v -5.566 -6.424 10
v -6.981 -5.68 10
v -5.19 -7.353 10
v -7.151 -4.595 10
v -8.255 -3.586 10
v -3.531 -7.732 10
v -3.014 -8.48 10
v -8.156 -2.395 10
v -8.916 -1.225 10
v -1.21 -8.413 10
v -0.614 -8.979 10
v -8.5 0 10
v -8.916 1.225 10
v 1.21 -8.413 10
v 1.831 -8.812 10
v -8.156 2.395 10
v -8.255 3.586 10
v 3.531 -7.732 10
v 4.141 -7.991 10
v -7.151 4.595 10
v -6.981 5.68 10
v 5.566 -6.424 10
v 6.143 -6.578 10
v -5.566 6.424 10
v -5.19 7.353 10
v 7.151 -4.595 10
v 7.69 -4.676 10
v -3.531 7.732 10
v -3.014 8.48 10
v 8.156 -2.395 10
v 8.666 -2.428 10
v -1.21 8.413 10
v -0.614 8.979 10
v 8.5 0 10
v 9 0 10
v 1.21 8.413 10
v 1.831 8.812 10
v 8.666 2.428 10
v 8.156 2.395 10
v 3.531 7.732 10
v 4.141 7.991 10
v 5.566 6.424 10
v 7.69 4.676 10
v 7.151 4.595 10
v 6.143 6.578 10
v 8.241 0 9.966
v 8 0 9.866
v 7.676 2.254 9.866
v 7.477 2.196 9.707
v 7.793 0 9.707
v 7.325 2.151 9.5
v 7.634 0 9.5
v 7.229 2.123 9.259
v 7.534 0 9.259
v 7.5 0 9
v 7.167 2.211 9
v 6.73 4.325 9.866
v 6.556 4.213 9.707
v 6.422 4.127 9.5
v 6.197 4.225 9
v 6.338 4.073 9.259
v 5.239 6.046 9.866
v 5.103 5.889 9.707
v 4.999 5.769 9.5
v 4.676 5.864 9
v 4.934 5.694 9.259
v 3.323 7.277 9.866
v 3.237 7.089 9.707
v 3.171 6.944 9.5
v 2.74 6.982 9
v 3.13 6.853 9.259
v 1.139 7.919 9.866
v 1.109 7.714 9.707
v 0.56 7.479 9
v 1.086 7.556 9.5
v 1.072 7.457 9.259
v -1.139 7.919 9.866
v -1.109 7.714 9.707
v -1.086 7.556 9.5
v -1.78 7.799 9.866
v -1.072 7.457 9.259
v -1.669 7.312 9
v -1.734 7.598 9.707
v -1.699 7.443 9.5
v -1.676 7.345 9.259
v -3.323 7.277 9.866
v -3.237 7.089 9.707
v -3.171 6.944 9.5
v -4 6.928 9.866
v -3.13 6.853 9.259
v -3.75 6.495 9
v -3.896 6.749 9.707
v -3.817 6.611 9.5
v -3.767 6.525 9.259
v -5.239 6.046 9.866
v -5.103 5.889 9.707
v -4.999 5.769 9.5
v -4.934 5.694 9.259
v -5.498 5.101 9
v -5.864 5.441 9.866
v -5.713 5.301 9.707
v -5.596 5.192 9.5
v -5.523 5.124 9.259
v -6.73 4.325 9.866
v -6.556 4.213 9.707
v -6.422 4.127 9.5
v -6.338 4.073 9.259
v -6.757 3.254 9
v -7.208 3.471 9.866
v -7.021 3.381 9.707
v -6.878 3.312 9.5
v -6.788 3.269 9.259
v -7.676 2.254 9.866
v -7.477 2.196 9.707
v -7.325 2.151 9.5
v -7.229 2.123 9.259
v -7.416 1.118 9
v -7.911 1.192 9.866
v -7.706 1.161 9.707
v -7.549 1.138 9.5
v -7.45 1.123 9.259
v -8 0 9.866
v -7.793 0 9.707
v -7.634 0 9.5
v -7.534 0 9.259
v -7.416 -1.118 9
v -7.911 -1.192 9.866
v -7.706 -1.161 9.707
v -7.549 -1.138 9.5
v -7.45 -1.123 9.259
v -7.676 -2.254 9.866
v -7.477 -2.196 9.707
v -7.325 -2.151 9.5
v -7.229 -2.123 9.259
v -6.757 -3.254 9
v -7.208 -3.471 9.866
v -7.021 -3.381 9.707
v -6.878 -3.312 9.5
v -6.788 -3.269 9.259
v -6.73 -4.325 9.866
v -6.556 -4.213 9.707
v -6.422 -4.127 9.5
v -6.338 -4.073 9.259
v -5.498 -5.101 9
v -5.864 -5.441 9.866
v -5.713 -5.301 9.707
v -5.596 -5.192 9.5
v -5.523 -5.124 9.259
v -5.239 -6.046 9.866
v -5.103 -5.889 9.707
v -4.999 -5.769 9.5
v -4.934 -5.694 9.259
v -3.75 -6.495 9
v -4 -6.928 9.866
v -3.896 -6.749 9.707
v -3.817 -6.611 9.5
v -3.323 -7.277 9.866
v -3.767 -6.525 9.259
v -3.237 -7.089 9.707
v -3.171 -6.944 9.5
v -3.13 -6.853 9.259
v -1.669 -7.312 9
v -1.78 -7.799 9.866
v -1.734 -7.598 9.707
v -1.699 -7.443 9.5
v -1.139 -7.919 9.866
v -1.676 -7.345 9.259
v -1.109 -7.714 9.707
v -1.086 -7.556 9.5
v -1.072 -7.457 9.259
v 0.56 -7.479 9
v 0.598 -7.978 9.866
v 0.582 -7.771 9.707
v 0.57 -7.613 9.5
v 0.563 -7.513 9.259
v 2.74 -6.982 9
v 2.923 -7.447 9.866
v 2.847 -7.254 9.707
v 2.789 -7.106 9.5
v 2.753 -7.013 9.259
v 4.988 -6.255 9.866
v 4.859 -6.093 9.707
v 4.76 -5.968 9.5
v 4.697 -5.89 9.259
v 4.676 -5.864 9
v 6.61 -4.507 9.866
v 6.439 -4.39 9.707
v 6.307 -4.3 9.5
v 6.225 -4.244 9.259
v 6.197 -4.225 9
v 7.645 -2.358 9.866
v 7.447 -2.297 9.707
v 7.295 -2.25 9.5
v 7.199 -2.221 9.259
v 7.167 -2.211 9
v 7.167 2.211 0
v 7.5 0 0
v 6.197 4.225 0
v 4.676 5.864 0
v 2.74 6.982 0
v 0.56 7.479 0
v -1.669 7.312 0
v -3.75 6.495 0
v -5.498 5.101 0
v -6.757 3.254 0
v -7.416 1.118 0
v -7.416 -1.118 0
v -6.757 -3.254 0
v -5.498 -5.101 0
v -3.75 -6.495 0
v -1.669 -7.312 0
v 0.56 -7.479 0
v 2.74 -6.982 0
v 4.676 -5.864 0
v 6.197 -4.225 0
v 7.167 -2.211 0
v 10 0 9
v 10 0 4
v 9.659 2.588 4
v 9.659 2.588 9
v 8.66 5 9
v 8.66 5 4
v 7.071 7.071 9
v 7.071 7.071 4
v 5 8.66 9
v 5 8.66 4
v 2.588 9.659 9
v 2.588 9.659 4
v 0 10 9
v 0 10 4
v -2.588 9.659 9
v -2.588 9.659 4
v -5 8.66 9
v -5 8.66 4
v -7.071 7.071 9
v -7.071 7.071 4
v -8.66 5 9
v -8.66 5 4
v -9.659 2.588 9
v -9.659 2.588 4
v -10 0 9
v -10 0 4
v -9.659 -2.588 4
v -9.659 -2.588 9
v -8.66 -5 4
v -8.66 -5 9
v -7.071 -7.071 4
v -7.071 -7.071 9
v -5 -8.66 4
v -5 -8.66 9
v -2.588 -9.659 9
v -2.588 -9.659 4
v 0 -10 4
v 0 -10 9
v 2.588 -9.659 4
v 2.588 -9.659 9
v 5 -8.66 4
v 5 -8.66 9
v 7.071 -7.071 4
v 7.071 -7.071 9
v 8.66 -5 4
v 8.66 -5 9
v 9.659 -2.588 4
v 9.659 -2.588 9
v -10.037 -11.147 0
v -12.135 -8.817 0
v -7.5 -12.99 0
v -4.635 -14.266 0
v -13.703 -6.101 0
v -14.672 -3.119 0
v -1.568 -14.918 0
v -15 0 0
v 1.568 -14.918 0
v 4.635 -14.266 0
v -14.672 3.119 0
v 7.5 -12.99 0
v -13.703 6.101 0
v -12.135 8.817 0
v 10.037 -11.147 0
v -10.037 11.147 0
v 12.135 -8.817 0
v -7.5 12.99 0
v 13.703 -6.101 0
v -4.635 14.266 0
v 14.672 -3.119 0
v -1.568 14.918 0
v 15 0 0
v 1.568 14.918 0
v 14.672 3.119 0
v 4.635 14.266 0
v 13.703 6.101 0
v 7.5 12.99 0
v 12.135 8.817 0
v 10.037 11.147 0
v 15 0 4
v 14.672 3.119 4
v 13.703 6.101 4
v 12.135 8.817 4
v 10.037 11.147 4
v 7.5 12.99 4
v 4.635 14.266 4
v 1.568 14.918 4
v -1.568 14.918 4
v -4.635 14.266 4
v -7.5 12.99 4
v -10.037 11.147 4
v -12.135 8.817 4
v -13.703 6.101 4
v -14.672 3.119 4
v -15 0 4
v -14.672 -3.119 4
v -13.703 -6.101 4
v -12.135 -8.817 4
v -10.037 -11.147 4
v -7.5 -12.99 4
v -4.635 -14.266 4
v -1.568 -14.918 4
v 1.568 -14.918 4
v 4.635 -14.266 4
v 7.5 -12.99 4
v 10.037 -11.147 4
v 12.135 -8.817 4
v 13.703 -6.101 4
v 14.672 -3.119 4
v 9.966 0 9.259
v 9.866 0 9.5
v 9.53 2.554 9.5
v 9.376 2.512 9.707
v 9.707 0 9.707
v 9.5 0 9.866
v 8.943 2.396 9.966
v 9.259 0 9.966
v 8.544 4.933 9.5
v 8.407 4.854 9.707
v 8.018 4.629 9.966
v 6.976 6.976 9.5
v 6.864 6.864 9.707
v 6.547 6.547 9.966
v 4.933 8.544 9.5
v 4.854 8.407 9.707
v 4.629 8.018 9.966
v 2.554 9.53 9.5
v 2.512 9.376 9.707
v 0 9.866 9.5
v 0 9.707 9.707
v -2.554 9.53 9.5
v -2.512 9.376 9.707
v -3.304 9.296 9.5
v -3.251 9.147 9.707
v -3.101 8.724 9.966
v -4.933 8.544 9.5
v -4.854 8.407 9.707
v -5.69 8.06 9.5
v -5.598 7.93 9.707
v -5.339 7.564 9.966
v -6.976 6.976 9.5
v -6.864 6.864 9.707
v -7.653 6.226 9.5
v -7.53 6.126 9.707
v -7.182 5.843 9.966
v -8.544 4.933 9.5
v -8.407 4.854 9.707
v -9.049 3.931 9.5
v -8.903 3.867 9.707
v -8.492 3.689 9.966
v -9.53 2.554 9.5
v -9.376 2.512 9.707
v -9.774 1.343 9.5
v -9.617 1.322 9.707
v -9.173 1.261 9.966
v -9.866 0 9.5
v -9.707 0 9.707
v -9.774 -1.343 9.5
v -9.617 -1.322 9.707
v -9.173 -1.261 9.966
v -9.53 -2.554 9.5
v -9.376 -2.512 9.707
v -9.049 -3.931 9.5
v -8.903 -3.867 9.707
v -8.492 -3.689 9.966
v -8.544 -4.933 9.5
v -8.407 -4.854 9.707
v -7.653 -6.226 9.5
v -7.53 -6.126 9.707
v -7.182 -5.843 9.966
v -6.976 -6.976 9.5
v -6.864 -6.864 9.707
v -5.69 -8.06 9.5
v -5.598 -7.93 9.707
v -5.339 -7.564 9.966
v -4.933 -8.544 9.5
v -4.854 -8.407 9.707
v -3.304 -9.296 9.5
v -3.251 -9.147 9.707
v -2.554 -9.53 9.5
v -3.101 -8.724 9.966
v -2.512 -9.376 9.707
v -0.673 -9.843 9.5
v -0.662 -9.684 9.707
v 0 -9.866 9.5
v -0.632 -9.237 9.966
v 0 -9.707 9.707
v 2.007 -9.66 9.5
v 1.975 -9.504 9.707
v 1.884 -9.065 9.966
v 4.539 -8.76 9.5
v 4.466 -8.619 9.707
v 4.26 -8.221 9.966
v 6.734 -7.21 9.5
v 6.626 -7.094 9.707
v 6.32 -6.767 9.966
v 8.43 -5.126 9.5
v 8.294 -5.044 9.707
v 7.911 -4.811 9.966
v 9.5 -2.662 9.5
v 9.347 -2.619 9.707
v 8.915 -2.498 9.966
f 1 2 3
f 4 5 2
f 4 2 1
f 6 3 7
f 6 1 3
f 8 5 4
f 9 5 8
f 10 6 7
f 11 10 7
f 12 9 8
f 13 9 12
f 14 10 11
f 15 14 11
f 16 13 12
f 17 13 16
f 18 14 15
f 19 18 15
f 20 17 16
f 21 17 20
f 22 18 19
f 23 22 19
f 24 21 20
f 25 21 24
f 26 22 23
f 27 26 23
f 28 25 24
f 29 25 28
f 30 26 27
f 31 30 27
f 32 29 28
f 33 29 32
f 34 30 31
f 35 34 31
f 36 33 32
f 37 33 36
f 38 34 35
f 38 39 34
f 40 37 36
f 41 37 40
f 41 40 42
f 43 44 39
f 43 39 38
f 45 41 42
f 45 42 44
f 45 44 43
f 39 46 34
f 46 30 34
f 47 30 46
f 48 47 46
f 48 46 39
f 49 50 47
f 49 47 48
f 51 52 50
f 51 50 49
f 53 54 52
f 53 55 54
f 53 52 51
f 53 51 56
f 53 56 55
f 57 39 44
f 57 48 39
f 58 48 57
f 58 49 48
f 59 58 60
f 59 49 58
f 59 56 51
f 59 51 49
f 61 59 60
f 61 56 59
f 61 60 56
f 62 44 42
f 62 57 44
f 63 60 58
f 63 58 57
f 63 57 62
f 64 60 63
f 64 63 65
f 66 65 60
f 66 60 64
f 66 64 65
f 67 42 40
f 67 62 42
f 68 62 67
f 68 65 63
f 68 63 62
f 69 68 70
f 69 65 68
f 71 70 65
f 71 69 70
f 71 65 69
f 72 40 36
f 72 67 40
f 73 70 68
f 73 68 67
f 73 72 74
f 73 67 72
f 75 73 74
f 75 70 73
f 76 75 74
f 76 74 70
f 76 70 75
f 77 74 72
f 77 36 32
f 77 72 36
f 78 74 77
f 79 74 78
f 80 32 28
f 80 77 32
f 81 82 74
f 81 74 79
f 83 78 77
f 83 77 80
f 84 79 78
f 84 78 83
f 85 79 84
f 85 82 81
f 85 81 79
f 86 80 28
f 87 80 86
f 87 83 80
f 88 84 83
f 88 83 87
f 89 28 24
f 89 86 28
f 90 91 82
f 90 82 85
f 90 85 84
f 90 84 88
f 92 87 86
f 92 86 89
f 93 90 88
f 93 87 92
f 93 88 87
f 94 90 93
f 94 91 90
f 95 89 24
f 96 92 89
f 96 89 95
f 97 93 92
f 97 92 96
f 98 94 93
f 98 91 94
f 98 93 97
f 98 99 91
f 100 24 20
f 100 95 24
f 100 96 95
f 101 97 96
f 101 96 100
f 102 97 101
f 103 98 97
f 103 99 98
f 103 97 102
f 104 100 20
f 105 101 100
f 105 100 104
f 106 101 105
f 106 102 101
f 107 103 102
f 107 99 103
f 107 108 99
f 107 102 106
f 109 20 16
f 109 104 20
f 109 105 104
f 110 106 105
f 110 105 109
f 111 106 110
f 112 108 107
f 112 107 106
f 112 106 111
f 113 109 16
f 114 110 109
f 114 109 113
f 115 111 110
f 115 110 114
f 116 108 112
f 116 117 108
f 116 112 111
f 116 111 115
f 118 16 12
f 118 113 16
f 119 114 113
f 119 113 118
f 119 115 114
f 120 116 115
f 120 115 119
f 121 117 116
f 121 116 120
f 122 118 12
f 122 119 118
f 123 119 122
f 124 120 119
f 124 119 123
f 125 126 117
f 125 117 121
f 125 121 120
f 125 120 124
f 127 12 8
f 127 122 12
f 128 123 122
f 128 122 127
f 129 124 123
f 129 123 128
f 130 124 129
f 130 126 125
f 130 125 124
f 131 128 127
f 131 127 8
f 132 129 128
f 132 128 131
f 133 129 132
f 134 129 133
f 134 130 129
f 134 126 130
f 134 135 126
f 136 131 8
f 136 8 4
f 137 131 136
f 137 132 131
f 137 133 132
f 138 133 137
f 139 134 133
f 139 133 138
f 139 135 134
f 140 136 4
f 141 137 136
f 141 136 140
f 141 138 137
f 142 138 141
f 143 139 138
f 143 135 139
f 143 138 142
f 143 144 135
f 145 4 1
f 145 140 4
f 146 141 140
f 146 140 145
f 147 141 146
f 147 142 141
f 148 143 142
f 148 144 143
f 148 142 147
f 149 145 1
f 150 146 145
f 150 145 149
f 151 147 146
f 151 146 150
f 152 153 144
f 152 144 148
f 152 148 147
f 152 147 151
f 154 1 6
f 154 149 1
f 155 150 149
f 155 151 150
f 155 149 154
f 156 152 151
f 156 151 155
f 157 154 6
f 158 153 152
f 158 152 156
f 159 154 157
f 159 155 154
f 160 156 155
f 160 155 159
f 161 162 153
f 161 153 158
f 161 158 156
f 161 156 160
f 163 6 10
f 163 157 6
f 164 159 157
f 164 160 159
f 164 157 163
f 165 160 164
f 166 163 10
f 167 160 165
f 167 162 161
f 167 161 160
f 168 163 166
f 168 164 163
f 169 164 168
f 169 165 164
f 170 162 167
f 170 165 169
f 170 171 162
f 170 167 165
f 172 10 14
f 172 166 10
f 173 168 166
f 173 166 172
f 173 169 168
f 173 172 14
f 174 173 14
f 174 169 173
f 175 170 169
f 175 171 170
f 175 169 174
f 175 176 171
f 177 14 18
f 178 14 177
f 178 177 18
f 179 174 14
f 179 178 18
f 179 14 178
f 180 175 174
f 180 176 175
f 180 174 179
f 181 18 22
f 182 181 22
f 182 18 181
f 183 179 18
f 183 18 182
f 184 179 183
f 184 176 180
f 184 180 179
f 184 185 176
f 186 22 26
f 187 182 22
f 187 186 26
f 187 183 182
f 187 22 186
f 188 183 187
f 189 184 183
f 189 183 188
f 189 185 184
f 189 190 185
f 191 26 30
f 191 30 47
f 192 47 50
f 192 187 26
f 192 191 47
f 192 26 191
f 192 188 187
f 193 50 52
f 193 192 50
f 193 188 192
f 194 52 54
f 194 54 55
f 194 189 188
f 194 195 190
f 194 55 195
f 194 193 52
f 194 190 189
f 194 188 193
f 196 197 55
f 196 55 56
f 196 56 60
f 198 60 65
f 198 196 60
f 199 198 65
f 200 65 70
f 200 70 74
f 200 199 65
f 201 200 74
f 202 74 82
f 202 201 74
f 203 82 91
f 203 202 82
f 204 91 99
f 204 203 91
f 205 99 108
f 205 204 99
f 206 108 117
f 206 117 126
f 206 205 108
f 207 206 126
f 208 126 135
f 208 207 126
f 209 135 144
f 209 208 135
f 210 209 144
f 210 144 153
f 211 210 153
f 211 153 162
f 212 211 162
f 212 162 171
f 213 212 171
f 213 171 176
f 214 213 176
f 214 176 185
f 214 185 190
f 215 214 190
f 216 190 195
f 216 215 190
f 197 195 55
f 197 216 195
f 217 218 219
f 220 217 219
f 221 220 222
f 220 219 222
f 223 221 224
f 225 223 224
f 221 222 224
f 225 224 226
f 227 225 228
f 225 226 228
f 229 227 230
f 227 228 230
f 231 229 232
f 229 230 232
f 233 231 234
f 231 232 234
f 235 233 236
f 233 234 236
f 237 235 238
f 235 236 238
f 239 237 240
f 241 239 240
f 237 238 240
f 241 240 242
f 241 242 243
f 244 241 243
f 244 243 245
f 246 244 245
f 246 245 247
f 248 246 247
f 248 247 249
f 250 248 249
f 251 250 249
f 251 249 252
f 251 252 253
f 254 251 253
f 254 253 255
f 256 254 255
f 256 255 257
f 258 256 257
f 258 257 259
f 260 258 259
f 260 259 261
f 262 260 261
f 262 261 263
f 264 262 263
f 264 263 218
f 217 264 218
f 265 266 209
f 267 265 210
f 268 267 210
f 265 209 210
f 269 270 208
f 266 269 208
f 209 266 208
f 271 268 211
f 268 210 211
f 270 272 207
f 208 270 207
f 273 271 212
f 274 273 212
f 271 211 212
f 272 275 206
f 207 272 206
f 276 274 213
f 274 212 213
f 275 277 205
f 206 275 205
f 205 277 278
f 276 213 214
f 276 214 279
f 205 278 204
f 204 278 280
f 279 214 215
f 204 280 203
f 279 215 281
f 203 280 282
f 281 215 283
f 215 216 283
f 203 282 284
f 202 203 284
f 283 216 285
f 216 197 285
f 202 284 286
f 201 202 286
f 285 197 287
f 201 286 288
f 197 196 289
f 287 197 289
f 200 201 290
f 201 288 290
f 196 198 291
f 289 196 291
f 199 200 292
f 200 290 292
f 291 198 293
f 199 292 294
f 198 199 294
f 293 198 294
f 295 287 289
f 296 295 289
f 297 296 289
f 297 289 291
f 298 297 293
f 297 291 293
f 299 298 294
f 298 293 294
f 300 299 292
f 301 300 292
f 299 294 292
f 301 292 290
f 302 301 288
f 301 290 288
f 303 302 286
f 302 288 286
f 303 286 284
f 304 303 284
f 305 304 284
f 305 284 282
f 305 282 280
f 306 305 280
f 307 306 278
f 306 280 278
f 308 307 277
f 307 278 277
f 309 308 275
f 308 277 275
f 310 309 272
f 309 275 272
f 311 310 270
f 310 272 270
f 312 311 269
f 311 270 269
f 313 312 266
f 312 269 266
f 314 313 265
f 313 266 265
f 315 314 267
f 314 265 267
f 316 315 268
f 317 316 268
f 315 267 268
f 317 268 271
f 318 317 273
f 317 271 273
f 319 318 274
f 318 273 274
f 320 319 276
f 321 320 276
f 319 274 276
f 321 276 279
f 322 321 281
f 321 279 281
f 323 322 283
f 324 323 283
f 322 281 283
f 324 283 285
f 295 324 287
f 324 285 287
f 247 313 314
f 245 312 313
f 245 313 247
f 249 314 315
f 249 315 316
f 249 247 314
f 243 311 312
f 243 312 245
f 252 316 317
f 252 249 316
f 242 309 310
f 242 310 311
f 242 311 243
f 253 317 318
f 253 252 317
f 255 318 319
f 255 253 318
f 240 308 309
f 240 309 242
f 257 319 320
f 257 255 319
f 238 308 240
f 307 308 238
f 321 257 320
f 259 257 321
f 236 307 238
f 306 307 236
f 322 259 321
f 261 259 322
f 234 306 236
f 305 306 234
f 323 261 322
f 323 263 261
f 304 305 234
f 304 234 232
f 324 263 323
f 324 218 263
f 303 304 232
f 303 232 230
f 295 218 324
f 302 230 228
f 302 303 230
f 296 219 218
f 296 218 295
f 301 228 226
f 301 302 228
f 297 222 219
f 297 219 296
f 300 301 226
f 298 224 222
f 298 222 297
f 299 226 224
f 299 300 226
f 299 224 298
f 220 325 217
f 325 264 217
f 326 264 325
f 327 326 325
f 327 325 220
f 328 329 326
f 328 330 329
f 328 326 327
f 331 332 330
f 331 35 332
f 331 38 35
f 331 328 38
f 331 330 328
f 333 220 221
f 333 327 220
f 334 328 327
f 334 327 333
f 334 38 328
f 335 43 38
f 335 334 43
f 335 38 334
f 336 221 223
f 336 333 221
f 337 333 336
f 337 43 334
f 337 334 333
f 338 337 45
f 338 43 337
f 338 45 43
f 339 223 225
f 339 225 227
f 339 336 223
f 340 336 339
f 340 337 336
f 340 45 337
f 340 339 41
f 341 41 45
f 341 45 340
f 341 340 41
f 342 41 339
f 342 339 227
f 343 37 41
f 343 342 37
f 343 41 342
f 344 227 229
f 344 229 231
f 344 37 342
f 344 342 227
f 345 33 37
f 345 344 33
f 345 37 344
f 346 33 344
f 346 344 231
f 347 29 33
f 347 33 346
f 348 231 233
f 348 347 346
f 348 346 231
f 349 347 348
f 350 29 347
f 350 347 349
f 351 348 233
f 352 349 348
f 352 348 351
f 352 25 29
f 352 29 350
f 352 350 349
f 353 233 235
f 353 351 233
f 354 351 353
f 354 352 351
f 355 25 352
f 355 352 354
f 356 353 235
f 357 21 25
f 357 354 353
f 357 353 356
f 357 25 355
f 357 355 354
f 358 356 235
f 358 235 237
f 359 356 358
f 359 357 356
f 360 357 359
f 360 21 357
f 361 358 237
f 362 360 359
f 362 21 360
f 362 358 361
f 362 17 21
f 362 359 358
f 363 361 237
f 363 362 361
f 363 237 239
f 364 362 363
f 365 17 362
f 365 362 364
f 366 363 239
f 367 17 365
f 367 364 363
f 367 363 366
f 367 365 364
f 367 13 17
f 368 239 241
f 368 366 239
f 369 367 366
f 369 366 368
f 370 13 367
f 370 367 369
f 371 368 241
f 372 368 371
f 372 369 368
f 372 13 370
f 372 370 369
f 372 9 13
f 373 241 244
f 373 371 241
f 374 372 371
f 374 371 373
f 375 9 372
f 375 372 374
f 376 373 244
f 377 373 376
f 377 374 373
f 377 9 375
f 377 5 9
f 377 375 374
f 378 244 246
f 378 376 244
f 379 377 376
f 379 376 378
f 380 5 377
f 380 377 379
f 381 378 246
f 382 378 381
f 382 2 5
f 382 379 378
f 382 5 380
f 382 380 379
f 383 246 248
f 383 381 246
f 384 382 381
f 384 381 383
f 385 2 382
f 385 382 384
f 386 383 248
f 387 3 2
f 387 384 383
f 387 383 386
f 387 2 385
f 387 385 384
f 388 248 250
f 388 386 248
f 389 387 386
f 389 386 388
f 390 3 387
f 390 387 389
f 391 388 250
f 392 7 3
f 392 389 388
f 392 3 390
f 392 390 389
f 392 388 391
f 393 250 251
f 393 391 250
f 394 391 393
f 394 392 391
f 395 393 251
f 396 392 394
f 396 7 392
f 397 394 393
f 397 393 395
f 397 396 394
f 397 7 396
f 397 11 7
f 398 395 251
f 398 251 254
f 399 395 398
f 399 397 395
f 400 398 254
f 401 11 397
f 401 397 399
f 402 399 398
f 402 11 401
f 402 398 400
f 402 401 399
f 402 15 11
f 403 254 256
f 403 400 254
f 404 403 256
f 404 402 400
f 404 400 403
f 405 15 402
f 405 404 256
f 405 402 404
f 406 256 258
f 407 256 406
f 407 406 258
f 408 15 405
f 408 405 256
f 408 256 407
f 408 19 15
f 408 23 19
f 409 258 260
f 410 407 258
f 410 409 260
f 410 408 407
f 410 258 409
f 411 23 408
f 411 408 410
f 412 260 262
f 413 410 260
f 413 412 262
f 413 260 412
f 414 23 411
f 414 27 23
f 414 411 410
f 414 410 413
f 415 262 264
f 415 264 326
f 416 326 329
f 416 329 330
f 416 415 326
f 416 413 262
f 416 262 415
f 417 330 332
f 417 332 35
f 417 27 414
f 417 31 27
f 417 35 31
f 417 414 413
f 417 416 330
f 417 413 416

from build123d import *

# Parameters (mm, degrees)
F0_R     = 15
F0_R_2   = 10
F1_DEPTH = 4
F0_R_3   = 7.5
F2_DEPTH = 10
F3_R     = 1


with BuildPart() as f1:
    # F0 (on Top) → F1 (new body)
    with BuildSketch(Plane.XY):
        Circle(F0_R)
        Circle(F0_R_2, mode=Mode.SUBTRACT)
    extrude(amount=F1_DEPTH)

    # F0 (on Top) → F2 (join)
    with BuildSketch(Plane.XY):
        Circle(F0_R_2)
        Circle(F0_R_3, mode=Mode.SUBTRACT)
    extrude(amount=F2_DEPTH)

    # F3
    f3_edges = [f1.edges().sort_by_distance(p)[0] for p in [
        (-7.5, 0, 10),
        (-10, 0, 10),
    ]]
    fillet(f3_edges, radius=F3_R)


solid = f1.part
